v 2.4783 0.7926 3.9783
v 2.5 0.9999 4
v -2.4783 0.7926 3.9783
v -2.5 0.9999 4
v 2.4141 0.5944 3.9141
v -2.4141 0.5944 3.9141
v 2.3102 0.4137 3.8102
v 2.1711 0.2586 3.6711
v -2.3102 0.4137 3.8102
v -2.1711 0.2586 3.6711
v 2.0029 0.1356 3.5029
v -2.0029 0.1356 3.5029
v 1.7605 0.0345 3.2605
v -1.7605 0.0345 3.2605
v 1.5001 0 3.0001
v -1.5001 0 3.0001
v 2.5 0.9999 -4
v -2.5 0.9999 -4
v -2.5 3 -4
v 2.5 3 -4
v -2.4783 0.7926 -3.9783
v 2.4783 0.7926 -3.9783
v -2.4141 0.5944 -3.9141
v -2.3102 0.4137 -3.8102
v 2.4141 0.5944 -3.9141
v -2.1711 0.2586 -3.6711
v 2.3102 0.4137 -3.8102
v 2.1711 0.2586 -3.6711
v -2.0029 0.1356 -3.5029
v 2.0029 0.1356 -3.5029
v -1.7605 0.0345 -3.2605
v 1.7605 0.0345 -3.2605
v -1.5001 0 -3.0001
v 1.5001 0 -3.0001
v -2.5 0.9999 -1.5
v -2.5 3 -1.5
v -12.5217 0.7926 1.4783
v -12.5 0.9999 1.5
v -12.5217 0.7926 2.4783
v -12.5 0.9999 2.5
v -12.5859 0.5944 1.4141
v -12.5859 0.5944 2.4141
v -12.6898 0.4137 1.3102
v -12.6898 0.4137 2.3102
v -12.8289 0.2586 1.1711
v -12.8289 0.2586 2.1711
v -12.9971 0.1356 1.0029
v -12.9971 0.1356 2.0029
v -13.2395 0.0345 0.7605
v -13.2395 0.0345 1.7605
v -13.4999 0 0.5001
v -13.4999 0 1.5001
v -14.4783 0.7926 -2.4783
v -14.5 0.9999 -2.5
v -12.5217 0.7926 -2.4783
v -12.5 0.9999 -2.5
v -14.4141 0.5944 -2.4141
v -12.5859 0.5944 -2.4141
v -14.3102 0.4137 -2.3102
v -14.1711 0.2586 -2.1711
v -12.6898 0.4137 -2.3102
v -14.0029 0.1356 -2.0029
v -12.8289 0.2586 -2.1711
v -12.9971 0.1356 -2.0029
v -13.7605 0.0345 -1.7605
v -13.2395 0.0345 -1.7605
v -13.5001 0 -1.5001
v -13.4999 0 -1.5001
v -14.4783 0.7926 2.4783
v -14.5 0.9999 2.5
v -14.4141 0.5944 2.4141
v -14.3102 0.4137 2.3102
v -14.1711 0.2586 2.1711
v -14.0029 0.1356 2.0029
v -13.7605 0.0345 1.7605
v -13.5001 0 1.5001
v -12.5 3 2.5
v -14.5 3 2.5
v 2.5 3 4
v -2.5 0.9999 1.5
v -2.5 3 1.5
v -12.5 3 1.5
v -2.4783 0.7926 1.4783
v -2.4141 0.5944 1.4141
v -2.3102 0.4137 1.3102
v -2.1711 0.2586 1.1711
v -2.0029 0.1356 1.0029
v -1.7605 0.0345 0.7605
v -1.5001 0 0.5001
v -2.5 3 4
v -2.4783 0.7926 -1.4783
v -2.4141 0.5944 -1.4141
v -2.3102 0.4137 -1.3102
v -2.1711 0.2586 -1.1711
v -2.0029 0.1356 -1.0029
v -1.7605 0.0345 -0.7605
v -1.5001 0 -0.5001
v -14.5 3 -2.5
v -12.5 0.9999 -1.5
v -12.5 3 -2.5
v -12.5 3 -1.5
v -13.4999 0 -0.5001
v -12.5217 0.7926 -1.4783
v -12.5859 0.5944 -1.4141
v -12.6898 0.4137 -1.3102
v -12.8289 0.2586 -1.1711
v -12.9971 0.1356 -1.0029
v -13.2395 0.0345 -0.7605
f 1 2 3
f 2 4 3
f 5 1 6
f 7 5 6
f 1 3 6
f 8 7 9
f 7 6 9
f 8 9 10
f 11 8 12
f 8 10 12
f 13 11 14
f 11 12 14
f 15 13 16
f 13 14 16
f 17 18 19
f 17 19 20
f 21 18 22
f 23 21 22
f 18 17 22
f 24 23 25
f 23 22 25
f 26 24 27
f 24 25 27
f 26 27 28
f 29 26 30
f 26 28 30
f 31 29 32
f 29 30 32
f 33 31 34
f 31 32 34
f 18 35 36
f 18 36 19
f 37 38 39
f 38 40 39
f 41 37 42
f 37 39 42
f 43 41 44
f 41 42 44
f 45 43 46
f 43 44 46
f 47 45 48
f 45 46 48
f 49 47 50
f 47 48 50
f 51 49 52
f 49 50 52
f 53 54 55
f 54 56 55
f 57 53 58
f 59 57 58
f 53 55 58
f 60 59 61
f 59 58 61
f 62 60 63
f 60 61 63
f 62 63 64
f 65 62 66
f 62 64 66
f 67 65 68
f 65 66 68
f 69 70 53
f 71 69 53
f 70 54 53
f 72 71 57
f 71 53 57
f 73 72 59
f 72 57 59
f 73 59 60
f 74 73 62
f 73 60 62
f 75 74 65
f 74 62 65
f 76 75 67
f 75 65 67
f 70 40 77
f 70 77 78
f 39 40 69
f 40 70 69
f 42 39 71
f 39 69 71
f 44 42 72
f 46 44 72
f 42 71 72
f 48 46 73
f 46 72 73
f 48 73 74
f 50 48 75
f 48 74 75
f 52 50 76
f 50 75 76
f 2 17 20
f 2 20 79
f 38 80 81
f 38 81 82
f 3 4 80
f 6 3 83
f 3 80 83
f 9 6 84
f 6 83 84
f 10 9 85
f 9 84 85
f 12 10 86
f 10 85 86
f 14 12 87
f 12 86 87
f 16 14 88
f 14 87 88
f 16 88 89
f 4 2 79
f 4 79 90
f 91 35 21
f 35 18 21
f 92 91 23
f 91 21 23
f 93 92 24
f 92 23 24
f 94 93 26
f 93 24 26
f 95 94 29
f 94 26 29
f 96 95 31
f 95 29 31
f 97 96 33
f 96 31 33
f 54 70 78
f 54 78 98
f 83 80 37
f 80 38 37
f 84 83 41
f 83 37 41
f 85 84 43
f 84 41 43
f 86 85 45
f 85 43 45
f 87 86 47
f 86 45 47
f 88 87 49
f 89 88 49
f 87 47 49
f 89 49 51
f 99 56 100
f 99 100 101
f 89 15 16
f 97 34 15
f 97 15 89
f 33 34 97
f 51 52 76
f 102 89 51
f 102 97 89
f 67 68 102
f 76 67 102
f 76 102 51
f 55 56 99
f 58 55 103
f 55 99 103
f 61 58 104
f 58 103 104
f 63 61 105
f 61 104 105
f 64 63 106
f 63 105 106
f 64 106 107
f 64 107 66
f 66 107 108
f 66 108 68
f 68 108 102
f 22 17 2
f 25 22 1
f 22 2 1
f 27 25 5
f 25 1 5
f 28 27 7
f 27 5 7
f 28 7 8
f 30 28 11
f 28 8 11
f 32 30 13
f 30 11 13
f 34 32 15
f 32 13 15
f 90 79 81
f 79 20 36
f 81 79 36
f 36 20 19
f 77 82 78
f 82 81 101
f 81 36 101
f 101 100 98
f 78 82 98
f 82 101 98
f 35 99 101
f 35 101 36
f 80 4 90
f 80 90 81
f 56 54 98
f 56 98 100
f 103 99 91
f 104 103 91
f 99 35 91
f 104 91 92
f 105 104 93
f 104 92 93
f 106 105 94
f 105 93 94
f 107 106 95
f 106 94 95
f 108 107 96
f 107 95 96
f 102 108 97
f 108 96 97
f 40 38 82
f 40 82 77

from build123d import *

# Parameters (mm, degrees)
BOSS_EXTRUDE1_DEPTH = 3
FILLET2_R           = 1


with BuildPart() as part:
    # Sketch1 → Boss-Extrude1 (new body)
    with BuildSketch(Plane(origin=(0, 0, 0), x_dir=(1, 0, 0), z_dir=(0, 1, 0))):
        Polygon((-12.5, -1.5), (-12.5, -2.5), (-14.5, -2.5), (-14.5, 2.5), (-12.5, 2.5), (-12.5, 1.5), (-2.5, 1.5), (-2.5, 4), (2.5, 4), (2.5, -4), (-2.5, -4), (-2.5, -1.5), align=None)
    extrude(amount=BOSS_EXTRUDE1_DEPTH)

    # Fillet2
    fillet2_edges = [part.edges().sort_by_distance(p)[0] for p in [
        (0, 0, 4),
        (-2.5, 0, 2.75),
        (-7.5, 0, 1.5),
        (-12.5, 0, 2),
        (-13.5, 0, 2.5),
        (-14.5, 0, 0),
        (-13.5, 0, -2.5),
        (-12.5, 0, -2),
        (-7.5, 0, -1.5),
        (-2.5, 0, -2.75),
        (0, 0, -4),
        (2.5, 0, 0),
    ]]
    fillet(fillet2_edges, radius=FILLET2_R - 0.0001)  # a hair under: the kernel refuses the full size


solid = part.part
